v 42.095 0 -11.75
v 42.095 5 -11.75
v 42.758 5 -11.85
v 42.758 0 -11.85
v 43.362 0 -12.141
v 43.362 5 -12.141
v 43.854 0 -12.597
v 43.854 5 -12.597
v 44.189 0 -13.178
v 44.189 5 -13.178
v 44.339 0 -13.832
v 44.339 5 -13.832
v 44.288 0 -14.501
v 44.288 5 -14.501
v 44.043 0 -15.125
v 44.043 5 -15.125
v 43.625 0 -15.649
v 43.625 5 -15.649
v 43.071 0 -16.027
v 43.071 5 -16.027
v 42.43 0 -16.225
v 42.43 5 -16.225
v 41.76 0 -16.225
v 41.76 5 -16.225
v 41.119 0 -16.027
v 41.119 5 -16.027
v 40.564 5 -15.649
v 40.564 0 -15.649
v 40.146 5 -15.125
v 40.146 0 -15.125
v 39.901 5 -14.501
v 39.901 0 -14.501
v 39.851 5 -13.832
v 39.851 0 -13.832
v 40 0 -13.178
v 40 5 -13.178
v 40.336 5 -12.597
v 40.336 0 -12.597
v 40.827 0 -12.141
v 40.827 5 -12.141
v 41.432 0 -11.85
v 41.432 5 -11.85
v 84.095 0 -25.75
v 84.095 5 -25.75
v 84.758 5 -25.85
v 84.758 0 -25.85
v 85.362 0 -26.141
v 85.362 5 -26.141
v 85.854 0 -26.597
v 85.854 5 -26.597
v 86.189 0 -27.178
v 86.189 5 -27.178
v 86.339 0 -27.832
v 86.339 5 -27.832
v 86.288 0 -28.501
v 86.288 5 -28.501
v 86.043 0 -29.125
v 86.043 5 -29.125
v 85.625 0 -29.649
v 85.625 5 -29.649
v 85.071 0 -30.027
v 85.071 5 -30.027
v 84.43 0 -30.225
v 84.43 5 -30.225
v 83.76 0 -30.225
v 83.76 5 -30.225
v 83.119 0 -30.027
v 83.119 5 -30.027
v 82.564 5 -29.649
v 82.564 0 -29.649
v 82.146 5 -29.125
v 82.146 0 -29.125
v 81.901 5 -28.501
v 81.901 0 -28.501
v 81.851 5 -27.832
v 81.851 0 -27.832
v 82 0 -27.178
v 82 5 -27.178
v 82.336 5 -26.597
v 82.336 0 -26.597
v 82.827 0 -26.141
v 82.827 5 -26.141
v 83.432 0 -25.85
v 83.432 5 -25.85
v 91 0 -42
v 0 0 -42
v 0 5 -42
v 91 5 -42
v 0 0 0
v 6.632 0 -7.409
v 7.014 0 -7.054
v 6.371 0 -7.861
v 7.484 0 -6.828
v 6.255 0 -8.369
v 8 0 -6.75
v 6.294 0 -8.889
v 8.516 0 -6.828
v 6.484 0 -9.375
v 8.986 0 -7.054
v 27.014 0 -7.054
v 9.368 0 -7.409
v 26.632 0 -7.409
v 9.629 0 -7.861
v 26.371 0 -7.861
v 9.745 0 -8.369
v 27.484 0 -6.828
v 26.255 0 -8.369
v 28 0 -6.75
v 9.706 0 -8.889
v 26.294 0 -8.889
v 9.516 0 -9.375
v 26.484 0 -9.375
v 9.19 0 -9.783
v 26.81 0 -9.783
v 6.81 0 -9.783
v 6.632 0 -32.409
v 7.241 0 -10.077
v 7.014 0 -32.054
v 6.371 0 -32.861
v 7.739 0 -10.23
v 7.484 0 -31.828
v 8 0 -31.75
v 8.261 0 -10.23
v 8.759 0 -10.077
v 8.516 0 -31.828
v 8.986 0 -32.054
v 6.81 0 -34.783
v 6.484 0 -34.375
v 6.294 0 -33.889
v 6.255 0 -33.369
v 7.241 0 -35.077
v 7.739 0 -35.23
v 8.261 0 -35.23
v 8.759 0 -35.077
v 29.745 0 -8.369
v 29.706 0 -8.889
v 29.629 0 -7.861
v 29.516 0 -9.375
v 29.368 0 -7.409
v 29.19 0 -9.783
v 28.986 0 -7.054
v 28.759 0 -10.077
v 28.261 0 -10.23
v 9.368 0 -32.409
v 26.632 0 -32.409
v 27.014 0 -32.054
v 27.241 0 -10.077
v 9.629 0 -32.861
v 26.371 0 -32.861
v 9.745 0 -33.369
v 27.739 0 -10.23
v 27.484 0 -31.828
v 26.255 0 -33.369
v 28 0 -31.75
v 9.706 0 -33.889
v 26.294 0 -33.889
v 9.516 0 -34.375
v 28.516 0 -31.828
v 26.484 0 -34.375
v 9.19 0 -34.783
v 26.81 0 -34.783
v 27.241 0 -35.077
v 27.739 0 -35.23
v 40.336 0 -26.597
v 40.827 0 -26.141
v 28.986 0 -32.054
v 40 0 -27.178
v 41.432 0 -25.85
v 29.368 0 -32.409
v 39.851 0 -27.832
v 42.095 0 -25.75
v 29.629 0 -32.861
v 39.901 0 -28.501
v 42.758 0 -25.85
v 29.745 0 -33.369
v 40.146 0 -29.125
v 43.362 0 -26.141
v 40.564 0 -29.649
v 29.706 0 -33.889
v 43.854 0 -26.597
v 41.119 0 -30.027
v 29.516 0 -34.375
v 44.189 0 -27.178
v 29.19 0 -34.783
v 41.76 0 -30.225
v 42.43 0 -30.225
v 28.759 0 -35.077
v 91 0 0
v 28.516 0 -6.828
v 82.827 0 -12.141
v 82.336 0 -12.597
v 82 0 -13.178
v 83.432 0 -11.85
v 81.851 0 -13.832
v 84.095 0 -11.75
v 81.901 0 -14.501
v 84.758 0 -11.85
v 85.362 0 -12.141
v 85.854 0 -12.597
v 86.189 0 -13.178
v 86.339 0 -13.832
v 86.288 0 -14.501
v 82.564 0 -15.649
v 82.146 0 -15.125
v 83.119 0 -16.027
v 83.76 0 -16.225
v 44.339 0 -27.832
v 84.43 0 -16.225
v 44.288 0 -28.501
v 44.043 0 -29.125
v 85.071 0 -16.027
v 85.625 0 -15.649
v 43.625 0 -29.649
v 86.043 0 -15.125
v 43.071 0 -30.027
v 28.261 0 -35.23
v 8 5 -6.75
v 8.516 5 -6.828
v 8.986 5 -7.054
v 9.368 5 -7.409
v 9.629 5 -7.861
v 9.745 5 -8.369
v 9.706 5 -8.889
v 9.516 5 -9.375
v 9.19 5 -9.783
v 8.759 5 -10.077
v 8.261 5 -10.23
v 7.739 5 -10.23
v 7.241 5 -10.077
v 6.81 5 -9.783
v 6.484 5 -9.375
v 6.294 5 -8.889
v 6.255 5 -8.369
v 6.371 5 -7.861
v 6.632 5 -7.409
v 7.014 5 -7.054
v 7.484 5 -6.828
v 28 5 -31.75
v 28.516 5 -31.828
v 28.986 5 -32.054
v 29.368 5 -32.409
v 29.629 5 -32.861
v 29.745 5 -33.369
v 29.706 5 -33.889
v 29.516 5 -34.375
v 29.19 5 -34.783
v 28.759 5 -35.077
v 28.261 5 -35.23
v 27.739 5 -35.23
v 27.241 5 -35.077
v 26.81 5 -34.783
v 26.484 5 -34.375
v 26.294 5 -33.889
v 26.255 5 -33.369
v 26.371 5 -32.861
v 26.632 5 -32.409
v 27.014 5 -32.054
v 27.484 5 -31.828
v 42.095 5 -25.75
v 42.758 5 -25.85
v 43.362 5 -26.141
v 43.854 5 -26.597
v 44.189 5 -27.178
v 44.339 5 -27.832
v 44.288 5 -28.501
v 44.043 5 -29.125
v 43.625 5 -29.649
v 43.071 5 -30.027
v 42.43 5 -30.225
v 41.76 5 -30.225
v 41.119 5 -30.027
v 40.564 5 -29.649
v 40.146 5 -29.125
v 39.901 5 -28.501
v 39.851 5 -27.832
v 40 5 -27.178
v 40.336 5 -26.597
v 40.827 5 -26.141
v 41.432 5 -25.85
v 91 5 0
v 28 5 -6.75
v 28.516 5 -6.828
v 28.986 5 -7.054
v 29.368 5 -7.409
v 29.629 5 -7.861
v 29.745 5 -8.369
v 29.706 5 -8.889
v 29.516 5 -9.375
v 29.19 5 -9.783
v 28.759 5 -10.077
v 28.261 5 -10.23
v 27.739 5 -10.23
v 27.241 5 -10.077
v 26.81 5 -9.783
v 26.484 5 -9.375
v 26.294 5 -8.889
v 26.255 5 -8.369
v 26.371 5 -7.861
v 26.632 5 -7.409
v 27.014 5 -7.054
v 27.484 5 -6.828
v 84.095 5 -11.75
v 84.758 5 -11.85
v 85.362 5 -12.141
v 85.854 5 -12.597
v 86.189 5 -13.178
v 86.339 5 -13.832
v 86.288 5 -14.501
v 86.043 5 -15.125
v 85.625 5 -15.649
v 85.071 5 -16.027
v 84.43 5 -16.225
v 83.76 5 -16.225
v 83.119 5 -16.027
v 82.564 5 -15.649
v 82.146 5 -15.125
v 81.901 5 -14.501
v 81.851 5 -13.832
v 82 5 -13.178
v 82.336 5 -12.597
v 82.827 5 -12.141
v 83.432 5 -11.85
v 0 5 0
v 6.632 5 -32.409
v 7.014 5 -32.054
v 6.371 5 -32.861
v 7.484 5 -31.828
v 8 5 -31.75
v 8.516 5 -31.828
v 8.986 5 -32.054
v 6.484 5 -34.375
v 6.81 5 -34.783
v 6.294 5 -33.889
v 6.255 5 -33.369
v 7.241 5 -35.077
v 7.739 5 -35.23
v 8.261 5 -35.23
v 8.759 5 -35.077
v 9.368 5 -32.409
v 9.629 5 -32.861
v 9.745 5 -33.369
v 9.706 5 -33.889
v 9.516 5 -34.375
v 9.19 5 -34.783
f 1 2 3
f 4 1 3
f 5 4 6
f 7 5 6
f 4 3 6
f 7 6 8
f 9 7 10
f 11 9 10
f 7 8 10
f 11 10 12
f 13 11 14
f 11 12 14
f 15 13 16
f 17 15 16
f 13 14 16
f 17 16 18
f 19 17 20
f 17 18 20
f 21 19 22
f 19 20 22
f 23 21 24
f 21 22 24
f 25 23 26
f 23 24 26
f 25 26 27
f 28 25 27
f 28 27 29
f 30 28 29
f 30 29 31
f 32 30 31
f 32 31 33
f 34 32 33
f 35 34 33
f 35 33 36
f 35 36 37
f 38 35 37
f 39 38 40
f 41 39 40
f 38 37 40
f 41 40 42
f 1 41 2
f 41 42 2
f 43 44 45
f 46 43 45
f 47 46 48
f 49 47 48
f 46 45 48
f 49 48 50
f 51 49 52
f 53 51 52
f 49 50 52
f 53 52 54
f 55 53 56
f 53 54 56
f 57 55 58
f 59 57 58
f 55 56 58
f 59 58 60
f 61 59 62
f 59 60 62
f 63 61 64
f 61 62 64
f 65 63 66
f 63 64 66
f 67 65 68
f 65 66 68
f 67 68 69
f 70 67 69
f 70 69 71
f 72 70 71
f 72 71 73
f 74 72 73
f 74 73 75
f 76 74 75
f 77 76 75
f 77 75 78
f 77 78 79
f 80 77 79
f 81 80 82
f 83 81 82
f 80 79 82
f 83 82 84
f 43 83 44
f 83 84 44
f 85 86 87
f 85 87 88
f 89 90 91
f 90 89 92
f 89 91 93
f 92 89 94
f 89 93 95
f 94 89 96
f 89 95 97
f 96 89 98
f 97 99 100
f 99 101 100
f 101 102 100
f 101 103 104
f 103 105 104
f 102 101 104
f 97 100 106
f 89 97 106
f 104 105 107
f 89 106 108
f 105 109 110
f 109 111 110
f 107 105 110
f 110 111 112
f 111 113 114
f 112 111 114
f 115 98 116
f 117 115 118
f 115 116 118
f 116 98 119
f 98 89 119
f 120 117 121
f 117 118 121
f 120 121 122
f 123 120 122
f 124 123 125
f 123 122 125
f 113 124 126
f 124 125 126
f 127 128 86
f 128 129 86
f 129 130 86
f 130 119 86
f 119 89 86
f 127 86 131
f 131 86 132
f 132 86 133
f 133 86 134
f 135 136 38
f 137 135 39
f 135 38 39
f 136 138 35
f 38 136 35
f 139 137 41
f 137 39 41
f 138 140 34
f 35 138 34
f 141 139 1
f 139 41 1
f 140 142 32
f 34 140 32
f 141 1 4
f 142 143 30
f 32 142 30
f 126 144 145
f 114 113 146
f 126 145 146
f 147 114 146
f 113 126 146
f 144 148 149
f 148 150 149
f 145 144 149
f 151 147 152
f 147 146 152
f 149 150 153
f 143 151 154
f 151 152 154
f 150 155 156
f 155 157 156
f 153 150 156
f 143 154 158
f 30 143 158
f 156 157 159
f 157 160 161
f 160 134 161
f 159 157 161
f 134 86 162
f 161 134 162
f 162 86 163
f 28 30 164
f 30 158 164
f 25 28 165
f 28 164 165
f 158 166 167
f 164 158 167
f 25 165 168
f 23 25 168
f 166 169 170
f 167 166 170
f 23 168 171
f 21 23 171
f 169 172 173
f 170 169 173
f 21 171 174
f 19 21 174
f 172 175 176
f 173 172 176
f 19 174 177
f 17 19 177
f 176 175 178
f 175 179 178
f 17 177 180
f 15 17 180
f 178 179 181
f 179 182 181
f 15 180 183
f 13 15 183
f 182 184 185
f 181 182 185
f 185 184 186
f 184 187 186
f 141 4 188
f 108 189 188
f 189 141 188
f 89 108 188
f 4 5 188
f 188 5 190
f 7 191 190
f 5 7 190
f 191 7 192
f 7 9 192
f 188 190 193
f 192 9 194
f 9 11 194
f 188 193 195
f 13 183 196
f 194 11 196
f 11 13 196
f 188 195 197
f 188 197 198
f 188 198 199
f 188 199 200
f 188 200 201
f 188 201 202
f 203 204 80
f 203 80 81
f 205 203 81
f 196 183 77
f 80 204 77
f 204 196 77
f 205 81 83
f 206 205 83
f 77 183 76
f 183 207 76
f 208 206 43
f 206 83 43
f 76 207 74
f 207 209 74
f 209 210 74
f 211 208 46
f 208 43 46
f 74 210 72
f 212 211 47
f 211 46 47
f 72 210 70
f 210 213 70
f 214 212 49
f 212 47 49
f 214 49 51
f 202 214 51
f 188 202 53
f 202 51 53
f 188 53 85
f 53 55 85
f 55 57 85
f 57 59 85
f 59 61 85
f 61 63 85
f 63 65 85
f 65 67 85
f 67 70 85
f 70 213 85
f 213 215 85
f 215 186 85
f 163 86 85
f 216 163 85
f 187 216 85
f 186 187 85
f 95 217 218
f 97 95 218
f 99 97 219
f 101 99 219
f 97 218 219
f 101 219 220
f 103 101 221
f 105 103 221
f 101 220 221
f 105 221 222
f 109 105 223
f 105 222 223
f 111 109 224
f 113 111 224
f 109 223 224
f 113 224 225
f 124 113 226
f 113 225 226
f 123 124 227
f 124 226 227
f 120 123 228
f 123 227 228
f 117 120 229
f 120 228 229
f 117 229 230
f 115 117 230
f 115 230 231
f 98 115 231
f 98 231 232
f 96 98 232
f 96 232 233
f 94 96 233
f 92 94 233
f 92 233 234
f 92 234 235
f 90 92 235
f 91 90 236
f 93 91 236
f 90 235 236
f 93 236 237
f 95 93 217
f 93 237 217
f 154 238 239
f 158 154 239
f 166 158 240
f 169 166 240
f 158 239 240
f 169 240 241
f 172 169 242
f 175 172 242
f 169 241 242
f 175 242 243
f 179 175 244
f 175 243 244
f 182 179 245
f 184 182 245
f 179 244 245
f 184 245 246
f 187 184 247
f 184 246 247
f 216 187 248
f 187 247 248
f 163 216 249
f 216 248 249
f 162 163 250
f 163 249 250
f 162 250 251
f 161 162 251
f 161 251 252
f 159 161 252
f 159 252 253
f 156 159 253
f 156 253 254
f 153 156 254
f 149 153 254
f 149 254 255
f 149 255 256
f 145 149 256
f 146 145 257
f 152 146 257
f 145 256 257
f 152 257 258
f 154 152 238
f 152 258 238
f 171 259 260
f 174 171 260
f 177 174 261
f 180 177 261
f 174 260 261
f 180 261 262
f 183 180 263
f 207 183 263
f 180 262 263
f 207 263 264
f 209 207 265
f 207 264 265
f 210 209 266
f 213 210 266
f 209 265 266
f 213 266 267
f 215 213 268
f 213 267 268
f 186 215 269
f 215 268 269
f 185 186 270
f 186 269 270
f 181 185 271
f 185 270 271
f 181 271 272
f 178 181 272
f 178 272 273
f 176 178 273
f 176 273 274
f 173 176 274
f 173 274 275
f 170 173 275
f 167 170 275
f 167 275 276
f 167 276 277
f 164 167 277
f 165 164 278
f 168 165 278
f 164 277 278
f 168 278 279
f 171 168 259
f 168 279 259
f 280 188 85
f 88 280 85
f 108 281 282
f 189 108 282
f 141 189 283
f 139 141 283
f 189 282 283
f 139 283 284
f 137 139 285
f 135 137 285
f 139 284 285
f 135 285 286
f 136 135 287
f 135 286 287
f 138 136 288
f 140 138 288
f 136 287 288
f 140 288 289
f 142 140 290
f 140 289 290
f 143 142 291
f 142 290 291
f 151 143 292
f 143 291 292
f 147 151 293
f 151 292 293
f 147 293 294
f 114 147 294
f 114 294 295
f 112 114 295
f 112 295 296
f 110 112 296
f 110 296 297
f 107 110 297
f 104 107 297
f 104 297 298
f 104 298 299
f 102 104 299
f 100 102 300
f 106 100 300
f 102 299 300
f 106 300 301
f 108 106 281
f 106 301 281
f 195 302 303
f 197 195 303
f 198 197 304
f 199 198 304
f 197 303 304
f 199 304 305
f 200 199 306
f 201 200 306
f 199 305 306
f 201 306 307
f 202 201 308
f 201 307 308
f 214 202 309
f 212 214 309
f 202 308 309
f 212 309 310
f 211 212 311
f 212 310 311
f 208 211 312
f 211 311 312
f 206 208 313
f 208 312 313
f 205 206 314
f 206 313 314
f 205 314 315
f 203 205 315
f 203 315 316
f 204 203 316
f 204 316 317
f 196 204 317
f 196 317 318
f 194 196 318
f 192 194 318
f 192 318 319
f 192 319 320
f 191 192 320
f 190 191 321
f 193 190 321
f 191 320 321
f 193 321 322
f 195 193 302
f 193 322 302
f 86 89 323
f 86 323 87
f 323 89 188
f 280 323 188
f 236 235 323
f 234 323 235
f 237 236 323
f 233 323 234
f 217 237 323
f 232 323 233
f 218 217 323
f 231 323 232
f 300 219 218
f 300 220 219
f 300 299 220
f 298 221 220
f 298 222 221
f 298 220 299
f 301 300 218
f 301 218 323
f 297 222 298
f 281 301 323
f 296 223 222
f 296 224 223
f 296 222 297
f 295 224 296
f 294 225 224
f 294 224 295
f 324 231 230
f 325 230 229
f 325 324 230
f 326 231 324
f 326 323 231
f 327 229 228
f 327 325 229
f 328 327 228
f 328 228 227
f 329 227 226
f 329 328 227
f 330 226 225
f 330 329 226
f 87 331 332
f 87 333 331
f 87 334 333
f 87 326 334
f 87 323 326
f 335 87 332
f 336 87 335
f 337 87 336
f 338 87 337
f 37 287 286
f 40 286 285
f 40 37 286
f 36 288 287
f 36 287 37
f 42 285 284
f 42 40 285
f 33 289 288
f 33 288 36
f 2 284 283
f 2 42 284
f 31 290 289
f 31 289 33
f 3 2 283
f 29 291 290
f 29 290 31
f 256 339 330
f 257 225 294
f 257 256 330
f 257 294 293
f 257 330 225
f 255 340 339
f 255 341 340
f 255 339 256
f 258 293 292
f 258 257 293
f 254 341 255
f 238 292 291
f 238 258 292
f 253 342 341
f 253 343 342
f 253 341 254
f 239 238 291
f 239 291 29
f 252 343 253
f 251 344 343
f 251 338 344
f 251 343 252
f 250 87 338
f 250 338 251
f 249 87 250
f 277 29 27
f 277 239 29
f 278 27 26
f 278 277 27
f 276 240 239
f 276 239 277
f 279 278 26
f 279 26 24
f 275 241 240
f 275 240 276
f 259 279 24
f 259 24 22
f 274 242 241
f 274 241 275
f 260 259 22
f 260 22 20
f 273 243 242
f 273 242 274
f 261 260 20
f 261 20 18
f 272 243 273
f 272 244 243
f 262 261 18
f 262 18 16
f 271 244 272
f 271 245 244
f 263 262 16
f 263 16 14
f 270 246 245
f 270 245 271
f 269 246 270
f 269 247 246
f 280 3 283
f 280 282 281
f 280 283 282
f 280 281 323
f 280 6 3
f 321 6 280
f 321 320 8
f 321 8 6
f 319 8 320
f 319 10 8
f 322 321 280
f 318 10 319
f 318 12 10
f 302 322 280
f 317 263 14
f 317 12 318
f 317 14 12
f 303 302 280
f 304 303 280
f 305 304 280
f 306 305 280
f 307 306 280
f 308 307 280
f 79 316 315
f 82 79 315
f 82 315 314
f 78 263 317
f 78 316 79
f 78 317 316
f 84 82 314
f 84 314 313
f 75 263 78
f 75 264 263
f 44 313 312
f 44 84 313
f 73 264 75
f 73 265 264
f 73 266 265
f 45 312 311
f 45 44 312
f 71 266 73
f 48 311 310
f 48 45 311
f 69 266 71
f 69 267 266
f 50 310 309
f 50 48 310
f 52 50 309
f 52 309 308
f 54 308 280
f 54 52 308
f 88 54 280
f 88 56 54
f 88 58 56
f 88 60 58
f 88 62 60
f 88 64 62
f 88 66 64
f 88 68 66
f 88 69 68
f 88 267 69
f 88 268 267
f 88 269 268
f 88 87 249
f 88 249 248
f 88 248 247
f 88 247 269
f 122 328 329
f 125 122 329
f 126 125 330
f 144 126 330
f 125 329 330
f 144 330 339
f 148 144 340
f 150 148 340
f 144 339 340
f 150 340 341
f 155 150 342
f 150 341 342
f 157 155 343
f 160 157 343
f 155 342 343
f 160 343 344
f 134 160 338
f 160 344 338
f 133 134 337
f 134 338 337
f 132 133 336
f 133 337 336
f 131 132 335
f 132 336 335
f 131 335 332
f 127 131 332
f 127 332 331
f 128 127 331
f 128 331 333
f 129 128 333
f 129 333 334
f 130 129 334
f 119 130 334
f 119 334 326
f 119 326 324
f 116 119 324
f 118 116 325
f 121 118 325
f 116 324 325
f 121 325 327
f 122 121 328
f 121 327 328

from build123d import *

# Parameters (mm, degrees)
SKETCH_1_W          = 91
SKETCH_1_H          = 42
EXTRUDE_1_DEPTH     = 5
SKETCH_2_R          = 1.75
SKETCH_2_R_2        = 2.25
CUT_EXTRUDE_1_DEPTH = 5


with BuildPart() as part:
    # 스케치1 → 보스-돌출1 (new body)
    with BuildSketch(Plane(origin=(0, 0, 0), x_dir=(1, 0, 0), z_dir=(0, 1, 0))):
        with Locations((45.5, 21)):
            Rectangle(SKETCH_1_W, SKETCH_1_H)
    extrude(amount=EXTRUDE_1_DEPTH)

    # 스케치2 → 컷-돌출1 (cut)
    with BuildSketch(Plane(origin=(0, 5, 0), x_dir=(1, 0, 0), z_dir=(0, 1, 0))):
        with Locations(Location((28, 33.5, 0), (0, 0, 270))):
            Circle(SKETCH_2_R)
        with Locations(Location((28, 8.5, 0), (0, 0, 270))):
            Circle(SKETCH_2_R)
        with Locations(Location((8, 8.5, 0), (0, 0, 270))):
            Circle(SKETCH_2_R)
        with Locations(Location((8, 33.5, 0), (0, 0, 270))):
            Circle(SKETCH_2_R)
        with Locations(Location((42.094873015, 28, 0), (0, 0, 270))):
            Circle(SKETCH_2_R_2)
        with Locations(Location((42.094873015, 14, 0), (0, 0, 270))):
            Circle(SKETCH_2_R_2)
        with Locations(Location((84.094873015, 14, 0), (0, 0, 270))):
            Circle(SKETCH_2_R_2)
        with Locations(Location((84.094873015, 28, 0), (0, 0, 270))):
            Circle(SKETCH_2_R_2)
    extrude(amount=-CUT_EXTRUDE_1_DEPTH, mode=Mode.SUBTRACT)


solid = part.part
